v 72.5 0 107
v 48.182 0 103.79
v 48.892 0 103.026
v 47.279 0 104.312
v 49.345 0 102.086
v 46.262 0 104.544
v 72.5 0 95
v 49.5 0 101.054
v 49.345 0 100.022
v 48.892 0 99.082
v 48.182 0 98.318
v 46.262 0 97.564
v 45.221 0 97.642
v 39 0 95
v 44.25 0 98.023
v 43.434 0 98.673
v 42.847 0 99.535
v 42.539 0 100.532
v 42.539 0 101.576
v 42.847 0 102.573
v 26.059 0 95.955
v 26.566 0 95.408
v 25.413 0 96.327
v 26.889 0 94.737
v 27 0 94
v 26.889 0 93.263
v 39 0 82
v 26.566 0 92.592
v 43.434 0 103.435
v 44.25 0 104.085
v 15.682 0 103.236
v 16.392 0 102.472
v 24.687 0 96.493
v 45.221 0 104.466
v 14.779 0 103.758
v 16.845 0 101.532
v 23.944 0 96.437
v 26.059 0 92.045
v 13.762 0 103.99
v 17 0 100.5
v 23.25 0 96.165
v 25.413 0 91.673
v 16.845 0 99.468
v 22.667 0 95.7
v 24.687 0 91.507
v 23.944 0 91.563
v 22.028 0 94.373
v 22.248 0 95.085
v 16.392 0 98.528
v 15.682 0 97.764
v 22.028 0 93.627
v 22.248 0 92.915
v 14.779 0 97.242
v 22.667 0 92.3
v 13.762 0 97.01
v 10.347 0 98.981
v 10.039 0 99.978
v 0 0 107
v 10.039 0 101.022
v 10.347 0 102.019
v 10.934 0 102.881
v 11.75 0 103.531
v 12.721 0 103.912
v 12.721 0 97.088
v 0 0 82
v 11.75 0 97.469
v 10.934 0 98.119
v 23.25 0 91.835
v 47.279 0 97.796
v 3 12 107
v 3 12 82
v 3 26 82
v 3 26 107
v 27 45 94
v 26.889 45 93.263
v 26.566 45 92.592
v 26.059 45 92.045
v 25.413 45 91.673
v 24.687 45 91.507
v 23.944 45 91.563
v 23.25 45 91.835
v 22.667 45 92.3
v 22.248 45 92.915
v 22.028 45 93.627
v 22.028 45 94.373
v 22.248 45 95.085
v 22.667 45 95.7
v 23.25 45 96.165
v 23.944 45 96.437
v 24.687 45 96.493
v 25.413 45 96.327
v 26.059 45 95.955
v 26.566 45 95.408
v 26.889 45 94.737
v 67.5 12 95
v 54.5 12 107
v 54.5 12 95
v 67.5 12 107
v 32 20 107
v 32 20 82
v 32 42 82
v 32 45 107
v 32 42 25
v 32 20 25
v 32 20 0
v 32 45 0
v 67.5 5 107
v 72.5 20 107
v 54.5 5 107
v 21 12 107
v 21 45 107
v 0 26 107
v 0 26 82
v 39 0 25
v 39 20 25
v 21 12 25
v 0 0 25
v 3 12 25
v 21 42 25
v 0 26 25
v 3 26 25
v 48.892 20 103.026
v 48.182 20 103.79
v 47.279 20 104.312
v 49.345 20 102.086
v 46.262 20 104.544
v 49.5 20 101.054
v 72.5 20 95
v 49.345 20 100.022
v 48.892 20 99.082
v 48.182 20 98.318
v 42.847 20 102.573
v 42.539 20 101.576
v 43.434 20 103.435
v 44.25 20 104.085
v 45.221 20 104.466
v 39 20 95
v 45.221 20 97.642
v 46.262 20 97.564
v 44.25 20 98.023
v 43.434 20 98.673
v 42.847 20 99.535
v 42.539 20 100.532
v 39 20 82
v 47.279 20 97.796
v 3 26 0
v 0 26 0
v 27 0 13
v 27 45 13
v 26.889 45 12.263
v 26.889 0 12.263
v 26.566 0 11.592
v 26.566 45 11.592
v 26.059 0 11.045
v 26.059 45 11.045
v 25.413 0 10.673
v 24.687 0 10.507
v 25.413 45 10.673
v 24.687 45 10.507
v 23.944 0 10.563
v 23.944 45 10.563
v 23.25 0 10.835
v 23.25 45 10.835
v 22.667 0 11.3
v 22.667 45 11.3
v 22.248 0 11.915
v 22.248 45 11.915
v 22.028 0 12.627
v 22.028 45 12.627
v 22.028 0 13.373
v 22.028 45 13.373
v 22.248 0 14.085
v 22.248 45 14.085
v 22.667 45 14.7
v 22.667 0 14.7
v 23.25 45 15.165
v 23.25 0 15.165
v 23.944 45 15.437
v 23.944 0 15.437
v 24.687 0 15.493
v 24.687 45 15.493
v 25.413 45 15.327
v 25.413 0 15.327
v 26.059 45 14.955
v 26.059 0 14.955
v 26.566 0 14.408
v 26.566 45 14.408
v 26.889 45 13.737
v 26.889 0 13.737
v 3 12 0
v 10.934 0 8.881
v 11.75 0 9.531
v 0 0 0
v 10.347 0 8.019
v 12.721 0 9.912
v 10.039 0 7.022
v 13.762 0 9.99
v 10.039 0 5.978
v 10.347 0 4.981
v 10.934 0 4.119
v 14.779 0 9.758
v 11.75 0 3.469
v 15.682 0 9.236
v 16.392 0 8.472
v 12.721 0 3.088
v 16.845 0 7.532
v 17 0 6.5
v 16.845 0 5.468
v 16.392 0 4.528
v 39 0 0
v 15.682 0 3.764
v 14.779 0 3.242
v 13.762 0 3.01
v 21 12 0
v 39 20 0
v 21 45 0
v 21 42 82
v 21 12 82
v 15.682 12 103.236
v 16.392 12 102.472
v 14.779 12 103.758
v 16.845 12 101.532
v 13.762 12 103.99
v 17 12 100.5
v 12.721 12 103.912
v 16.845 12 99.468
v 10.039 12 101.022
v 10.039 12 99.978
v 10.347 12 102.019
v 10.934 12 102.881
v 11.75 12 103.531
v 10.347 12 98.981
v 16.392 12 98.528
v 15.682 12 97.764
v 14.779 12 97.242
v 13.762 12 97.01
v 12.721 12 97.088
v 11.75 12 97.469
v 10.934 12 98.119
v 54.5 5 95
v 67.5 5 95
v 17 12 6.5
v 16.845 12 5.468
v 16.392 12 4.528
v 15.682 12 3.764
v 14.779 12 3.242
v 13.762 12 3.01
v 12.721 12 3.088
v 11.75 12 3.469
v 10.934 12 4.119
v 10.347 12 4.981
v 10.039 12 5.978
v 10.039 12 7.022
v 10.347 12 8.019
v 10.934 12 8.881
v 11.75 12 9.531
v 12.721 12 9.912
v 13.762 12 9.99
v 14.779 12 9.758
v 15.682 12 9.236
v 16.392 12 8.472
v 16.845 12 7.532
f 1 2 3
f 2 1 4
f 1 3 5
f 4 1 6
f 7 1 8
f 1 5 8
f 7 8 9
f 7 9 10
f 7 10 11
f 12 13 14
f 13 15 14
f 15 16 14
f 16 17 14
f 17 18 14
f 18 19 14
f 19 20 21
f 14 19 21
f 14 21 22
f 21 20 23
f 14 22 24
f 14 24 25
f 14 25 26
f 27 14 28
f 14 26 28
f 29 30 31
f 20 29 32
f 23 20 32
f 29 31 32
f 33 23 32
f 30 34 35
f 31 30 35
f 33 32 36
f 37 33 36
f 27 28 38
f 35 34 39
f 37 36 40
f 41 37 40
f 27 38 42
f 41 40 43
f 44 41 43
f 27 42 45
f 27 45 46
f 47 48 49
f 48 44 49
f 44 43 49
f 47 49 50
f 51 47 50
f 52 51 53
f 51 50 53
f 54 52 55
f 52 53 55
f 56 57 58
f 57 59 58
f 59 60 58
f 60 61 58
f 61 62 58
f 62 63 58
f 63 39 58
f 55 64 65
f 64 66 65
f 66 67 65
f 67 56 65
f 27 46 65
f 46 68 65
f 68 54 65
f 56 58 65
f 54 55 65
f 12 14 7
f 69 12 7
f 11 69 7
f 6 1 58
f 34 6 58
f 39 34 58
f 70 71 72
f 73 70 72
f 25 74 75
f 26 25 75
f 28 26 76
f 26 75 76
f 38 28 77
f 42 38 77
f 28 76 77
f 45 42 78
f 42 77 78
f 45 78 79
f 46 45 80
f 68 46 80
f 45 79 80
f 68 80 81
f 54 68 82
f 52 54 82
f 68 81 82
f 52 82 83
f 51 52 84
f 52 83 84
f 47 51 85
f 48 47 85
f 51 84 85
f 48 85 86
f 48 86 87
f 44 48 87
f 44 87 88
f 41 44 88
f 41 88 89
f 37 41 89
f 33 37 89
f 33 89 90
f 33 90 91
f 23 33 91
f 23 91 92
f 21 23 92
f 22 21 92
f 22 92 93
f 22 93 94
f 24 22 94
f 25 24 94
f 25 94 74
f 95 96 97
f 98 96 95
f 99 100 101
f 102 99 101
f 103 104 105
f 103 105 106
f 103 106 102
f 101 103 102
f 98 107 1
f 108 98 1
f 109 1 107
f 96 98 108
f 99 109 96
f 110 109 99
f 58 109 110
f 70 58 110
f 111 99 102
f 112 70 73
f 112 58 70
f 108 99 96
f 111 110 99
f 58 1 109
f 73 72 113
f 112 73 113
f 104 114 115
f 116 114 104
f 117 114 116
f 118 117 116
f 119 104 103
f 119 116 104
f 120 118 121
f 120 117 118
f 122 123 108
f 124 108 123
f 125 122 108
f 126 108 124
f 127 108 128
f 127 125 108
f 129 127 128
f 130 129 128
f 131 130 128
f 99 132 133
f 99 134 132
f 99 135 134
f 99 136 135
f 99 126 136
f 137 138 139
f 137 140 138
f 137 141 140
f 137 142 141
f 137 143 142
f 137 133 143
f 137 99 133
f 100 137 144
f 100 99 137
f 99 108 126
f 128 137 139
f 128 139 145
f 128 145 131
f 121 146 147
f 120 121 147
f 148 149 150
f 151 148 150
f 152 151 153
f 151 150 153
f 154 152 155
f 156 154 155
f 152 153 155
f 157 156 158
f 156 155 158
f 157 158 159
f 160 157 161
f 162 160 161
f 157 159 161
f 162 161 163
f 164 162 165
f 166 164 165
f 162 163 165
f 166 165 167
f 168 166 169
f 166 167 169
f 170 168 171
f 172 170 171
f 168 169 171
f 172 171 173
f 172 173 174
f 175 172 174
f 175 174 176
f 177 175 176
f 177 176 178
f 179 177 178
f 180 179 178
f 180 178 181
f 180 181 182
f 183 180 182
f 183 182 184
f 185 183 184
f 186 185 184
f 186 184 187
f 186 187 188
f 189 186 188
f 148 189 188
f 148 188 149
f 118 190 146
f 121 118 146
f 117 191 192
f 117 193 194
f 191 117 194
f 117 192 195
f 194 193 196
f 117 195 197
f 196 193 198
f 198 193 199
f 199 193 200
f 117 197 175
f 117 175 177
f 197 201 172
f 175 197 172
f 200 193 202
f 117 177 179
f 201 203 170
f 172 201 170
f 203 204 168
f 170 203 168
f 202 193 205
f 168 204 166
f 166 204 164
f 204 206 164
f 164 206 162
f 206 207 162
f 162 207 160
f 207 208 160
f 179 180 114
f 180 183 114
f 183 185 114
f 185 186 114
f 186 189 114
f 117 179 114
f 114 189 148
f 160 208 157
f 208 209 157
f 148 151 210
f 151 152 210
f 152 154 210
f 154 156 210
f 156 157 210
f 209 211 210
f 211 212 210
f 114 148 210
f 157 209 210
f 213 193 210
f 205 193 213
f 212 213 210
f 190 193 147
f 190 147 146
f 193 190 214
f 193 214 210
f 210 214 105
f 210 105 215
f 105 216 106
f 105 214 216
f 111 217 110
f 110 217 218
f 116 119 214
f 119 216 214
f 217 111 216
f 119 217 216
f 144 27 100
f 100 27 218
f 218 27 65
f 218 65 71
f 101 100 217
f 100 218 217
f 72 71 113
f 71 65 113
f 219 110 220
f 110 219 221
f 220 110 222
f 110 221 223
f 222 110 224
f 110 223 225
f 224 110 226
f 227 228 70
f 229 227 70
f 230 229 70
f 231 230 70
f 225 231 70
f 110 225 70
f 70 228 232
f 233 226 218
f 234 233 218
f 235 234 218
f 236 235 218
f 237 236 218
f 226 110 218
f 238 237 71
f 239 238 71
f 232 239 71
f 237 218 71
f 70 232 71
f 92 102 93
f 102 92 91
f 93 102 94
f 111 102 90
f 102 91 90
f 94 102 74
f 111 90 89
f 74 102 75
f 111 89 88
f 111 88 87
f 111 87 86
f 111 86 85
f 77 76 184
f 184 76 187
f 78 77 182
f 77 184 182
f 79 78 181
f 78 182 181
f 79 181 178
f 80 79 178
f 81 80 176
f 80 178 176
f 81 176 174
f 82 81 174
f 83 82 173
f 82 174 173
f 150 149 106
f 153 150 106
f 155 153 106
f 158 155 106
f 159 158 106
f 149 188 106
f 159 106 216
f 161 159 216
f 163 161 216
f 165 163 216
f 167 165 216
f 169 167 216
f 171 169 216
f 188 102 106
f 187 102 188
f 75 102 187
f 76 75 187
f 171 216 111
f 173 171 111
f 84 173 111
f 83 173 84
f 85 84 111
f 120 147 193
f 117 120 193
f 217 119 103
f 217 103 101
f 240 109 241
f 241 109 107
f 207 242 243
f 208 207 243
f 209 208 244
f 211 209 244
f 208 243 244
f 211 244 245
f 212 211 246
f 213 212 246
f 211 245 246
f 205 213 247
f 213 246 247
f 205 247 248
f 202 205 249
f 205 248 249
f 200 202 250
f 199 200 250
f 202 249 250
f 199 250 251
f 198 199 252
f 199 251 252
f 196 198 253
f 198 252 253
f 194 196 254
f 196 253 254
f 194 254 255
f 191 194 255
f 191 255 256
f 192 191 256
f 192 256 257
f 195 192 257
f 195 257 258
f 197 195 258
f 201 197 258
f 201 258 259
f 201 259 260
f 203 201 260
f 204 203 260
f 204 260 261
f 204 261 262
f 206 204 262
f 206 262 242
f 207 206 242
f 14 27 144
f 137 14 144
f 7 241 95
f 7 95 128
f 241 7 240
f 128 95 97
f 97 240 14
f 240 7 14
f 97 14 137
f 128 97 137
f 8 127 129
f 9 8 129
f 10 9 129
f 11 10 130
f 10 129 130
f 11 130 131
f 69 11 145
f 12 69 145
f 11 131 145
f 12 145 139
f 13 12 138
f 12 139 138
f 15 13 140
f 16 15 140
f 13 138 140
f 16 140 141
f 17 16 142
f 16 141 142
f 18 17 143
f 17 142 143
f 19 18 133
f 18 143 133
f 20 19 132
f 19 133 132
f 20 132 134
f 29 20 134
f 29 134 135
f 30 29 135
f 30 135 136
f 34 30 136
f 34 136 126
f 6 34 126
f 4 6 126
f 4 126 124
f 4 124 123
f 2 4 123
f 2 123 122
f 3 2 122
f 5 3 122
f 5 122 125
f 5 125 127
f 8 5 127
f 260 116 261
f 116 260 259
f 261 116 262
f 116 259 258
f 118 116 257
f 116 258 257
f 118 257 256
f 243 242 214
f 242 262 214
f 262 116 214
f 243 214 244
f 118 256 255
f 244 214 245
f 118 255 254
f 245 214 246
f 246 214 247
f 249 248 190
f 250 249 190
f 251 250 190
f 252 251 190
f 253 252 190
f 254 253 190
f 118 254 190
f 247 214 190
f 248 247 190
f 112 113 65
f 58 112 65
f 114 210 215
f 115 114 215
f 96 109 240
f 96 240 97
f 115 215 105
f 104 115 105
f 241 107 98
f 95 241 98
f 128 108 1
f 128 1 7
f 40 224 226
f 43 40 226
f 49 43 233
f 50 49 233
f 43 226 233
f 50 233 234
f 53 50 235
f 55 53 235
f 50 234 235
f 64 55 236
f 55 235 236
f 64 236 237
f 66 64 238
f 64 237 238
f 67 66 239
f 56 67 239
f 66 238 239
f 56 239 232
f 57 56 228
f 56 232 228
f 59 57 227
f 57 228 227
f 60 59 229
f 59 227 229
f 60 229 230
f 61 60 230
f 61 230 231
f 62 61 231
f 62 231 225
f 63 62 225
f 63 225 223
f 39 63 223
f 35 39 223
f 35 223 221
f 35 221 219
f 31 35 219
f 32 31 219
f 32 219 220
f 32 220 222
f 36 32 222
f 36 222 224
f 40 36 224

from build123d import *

# Parameters (mm, degrees)
SALIENTE_EXTRUIR1_DEPTH = 107
CROQUIS3_W              = 57
CROQUIS3_H              = 42
CORTAR_EXTRUIR1_DEPTH   = 39
CORTAR_EXTRUIR2_REACH   = 47
CROQUIS2_R              = 2.5
CORTAR_EXTRUIR3_REACH   = 14
CROQUIS4_R              = 3.5
CROQUIS5_W              = 12
CROQUIS5_H              = 20
SALIENTE_EXTRUIR2_DEPTH = 33.5
CORTAR_EXTRUIR4_REACH   = 22
CROQUIS7_R              = 3.5
CORTAR_EXTRUIR5_REACH   = 109
CROQUIS8_W              = 13
CROQUIS8_H              = 7


with BuildPart() as part:
    # Croquis1 → Saliente-Extruir1 (new body)
    with BuildSketch(Plane.XY):
        Polygon((0, 0), (39, 0), (39, 20), (32, 20), (32, 45), (21, 45), (21, 12), (3, 12), (3, 26), (0, 26), align=None)
    extrude(amount=SALIENTE_EXTRUIR1_DEPTH)

    # Croquis3 → Cortar-Extruir1 (cut)
    with BuildSketch(Plane.ZY):
        with Locations((53.5, 21)):
            Rectangle(CROQUIS3_W, CROQUIS3_H)
    extrude(amount=-CORTAR_EXTRUIR1_DEPTH, mode=Mode.SUBTRACT)

    # Croquis2 → Cortar-Extruir2 (cut, up to next)
    with BuildSketch(Plane(origin=(0, 45, 0), x_dir=(1, 0, 0), z_dir=(0, 1, 0)), mode=Mode.PRIVATE) as cortar_extruir2_sk1:
        with Locations((24.5, -94)):
            Circle(CROQUIS2_R)
    cortar_extruir2_tool1 = extrude(cortar_extruir2_sk1.sketch, amount=-CORTAR_EXTRUIR2_REACH, mode=Mode.PRIVATE) & part.part
    add(cortar_extruir2_tool1.solids().sort_by_distance((24.5, 45, 94))[0], mode=Mode.SUBTRACT)
    # Croquis2 → Cortar-Extruir2 (cut, up to next)
    with BuildSketch(Plane(origin=(0, 45, 0), x_dir=(1, 0, 0), z_dir=(0, 1, 0)), mode=Mode.PRIVATE) as cortar_extruir2_sk2:
        with Locations((24.5, -13)):
            Circle(CROQUIS2_R)
    cortar_extruir2_tool2 = extrude(cortar_extruir2_sk2.sketch, amount=-CORTAR_EXTRUIR2_REACH, mode=Mode.PRIVATE) & part.part
    add(cortar_extruir2_tool2.solids().sort_by_distance((24.5, 45, 13))[0], mode=Mode.SUBTRACT)

    # Croquis4 → Cortar-Extruir3 (cut, up to next)
    with BuildSketch(Plane(origin=(0, 12, 0), x_dir=(1, 0, 0), z_dir=(0, 1, 0)), mode=Mode.PRIVATE) as cortar_extruir3_sk1:
        with Locations((13.5, -100.5)):
            Circle(CROQUIS4_R)
    cortar_extruir3_tool1 = extrude(cortar_extruir3_sk1.sketch, amount=-CORTAR_EXTRUIR3_REACH, mode=Mode.PRIVATE) & part.part
    add(cortar_extruir3_tool1.solids().sort_by_distance((13.5, 12, 100.5))[0], mode=Mode.SUBTRACT)
    # Croquis4 → Cortar-Extruir3 (cut, up to next)
    with BuildSketch(Plane(origin=(0, 12, 0), x_dir=(1, 0, 0), z_dir=(0, 1, 0)), mode=Mode.PRIVATE) as cortar_extruir3_sk2:
        with Locations((13.5, -6.5)):
            Circle(CROQUIS4_R)
    cortar_extruir3_tool2 = extrude(cortar_extruir3_sk2.sketch, amount=-CORTAR_EXTRUIR3_REACH, mode=Mode.PRIVATE) & part.part
    add(cortar_extruir3_tool2.solids().sort_by_distance((13.5, 12, 6.5))[0], mode=Mode.SUBTRACT)

    # Croquis5 → Saliente-Extruir2 (add)
    with BuildSketch(Plane(origin=(39, 0, 0), x_dir=(0, 0, -1), z_dir=(1, 0, 0))):
        with Locations((-101, 10)):
            Rectangle(CROQUIS5_W, CROQUIS5_H)
    extrude(amount=SALIENTE_EXTRUIR2_DEPTH)

    # Croquis7 → Cortar-Extruir4 (cut, up to next)
    with BuildSketch(Plane(origin=(0, 20, 0), x_dir=(1, 0, 0), z_dir=(0, 1, 0)), mode=Mode.PRIVATE) as cortar_extruir4_sk1:
        with Locations((46, -101.053923336)):
            Circle(CROQUIS7_R)
    cortar_extruir4_tool1 = extrude(cortar_extruir4_sk1.sketch, amount=-CORTAR_EXTRUIR4_REACH, mode=Mode.PRIVATE) & part.part
    add(cortar_extruir4_tool1.solids().sort_by_distance((46, 20, 101.053923))[0], mode=Mode.SUBTRACT)

    # Croquis8 → Cortar-Extruir5 (cut, up to next)
    with BuildSketch(Plane.XY.offset(107), mode=Mode.PRIVATE) as cortar_extruir5_sk1:
        with Locations((61, 8.5)):
            Rectangle(CROQUIS8_W, CROQUIS8_H)
    cortar_extruir5_tool1 = extrude(cortar_extruir5_sk1.sketch, amount=-CORTAR_EXTRUIR5_REACH, mode=Mode.PRIVATE) & part.part
    add(cortar_extruir5_tool1.solids().sort_by_distance((61, 8.5, 107))[0], mode=Mode.SUBTRACT)


solid = part.part
